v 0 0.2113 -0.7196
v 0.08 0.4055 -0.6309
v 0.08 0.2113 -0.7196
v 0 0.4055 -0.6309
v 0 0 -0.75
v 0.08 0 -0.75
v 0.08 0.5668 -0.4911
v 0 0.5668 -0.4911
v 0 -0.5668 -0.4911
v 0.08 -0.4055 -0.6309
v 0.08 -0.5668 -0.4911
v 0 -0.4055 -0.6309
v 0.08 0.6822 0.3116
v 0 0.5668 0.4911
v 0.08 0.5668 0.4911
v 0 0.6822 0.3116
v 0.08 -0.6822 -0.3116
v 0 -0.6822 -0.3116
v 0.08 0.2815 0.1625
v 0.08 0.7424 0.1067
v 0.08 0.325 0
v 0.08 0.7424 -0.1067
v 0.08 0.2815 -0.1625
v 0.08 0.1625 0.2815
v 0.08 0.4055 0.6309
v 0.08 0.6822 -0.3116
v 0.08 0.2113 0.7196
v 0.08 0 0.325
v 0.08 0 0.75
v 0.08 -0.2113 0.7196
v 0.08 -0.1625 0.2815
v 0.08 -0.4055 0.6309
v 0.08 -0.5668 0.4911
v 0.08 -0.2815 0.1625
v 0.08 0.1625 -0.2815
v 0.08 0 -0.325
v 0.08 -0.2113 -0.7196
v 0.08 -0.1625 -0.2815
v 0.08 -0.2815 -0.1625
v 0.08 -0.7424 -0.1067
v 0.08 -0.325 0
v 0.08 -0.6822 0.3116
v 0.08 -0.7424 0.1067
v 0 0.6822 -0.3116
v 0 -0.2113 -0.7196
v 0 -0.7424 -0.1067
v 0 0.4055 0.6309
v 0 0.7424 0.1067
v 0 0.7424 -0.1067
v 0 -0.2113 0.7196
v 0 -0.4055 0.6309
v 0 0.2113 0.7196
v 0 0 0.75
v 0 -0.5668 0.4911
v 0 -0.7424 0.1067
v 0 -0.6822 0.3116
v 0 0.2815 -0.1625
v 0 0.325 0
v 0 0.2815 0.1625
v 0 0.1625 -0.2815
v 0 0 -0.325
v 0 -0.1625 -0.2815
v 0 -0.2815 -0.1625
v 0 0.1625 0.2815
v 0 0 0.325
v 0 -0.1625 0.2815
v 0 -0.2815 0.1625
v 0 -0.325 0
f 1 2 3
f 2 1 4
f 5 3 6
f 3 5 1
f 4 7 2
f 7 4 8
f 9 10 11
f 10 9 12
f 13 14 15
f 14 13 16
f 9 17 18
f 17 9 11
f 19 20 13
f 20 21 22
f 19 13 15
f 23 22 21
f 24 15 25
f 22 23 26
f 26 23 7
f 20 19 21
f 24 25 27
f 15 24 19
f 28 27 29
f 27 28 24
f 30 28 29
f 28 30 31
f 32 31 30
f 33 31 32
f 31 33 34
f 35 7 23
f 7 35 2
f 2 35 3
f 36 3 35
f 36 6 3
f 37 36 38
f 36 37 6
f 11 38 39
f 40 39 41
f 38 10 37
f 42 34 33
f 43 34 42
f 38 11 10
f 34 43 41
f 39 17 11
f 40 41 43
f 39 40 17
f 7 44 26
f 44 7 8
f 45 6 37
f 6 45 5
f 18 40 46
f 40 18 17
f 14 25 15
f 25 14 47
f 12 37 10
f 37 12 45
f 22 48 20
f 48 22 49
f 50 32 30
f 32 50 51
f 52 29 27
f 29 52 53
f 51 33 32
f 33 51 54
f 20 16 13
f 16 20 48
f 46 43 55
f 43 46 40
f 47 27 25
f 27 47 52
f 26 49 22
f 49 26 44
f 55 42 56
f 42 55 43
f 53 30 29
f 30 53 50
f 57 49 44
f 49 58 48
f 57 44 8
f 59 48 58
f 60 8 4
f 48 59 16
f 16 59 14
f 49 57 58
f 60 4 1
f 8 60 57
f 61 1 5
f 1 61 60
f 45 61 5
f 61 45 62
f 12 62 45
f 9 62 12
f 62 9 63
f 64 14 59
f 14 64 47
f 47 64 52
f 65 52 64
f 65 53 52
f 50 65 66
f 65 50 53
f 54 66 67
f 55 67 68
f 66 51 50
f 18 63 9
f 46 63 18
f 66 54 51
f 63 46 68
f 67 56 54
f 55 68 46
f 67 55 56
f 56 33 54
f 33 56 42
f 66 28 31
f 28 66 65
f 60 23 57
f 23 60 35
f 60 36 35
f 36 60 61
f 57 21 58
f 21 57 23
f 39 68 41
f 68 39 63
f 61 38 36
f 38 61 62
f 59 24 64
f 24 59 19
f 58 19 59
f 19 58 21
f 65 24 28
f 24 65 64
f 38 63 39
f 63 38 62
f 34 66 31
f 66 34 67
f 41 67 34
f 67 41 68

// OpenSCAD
module washer(rotation=0, thickness = 0.08) 
{
    diameter = 1.5;
    hole = 0.65;
    
    rotate([0,90,rotation]) 
    translate([0,0,thickness*0.5]) 
    {
        difference() {
            cylinder(h=thickness, r=diameter/2, $fn = 22, center=true);
            cylinder(h=thickness+0.1, r=hole/2, $fn = 12, center=true);
        }
    }
}

washer();
